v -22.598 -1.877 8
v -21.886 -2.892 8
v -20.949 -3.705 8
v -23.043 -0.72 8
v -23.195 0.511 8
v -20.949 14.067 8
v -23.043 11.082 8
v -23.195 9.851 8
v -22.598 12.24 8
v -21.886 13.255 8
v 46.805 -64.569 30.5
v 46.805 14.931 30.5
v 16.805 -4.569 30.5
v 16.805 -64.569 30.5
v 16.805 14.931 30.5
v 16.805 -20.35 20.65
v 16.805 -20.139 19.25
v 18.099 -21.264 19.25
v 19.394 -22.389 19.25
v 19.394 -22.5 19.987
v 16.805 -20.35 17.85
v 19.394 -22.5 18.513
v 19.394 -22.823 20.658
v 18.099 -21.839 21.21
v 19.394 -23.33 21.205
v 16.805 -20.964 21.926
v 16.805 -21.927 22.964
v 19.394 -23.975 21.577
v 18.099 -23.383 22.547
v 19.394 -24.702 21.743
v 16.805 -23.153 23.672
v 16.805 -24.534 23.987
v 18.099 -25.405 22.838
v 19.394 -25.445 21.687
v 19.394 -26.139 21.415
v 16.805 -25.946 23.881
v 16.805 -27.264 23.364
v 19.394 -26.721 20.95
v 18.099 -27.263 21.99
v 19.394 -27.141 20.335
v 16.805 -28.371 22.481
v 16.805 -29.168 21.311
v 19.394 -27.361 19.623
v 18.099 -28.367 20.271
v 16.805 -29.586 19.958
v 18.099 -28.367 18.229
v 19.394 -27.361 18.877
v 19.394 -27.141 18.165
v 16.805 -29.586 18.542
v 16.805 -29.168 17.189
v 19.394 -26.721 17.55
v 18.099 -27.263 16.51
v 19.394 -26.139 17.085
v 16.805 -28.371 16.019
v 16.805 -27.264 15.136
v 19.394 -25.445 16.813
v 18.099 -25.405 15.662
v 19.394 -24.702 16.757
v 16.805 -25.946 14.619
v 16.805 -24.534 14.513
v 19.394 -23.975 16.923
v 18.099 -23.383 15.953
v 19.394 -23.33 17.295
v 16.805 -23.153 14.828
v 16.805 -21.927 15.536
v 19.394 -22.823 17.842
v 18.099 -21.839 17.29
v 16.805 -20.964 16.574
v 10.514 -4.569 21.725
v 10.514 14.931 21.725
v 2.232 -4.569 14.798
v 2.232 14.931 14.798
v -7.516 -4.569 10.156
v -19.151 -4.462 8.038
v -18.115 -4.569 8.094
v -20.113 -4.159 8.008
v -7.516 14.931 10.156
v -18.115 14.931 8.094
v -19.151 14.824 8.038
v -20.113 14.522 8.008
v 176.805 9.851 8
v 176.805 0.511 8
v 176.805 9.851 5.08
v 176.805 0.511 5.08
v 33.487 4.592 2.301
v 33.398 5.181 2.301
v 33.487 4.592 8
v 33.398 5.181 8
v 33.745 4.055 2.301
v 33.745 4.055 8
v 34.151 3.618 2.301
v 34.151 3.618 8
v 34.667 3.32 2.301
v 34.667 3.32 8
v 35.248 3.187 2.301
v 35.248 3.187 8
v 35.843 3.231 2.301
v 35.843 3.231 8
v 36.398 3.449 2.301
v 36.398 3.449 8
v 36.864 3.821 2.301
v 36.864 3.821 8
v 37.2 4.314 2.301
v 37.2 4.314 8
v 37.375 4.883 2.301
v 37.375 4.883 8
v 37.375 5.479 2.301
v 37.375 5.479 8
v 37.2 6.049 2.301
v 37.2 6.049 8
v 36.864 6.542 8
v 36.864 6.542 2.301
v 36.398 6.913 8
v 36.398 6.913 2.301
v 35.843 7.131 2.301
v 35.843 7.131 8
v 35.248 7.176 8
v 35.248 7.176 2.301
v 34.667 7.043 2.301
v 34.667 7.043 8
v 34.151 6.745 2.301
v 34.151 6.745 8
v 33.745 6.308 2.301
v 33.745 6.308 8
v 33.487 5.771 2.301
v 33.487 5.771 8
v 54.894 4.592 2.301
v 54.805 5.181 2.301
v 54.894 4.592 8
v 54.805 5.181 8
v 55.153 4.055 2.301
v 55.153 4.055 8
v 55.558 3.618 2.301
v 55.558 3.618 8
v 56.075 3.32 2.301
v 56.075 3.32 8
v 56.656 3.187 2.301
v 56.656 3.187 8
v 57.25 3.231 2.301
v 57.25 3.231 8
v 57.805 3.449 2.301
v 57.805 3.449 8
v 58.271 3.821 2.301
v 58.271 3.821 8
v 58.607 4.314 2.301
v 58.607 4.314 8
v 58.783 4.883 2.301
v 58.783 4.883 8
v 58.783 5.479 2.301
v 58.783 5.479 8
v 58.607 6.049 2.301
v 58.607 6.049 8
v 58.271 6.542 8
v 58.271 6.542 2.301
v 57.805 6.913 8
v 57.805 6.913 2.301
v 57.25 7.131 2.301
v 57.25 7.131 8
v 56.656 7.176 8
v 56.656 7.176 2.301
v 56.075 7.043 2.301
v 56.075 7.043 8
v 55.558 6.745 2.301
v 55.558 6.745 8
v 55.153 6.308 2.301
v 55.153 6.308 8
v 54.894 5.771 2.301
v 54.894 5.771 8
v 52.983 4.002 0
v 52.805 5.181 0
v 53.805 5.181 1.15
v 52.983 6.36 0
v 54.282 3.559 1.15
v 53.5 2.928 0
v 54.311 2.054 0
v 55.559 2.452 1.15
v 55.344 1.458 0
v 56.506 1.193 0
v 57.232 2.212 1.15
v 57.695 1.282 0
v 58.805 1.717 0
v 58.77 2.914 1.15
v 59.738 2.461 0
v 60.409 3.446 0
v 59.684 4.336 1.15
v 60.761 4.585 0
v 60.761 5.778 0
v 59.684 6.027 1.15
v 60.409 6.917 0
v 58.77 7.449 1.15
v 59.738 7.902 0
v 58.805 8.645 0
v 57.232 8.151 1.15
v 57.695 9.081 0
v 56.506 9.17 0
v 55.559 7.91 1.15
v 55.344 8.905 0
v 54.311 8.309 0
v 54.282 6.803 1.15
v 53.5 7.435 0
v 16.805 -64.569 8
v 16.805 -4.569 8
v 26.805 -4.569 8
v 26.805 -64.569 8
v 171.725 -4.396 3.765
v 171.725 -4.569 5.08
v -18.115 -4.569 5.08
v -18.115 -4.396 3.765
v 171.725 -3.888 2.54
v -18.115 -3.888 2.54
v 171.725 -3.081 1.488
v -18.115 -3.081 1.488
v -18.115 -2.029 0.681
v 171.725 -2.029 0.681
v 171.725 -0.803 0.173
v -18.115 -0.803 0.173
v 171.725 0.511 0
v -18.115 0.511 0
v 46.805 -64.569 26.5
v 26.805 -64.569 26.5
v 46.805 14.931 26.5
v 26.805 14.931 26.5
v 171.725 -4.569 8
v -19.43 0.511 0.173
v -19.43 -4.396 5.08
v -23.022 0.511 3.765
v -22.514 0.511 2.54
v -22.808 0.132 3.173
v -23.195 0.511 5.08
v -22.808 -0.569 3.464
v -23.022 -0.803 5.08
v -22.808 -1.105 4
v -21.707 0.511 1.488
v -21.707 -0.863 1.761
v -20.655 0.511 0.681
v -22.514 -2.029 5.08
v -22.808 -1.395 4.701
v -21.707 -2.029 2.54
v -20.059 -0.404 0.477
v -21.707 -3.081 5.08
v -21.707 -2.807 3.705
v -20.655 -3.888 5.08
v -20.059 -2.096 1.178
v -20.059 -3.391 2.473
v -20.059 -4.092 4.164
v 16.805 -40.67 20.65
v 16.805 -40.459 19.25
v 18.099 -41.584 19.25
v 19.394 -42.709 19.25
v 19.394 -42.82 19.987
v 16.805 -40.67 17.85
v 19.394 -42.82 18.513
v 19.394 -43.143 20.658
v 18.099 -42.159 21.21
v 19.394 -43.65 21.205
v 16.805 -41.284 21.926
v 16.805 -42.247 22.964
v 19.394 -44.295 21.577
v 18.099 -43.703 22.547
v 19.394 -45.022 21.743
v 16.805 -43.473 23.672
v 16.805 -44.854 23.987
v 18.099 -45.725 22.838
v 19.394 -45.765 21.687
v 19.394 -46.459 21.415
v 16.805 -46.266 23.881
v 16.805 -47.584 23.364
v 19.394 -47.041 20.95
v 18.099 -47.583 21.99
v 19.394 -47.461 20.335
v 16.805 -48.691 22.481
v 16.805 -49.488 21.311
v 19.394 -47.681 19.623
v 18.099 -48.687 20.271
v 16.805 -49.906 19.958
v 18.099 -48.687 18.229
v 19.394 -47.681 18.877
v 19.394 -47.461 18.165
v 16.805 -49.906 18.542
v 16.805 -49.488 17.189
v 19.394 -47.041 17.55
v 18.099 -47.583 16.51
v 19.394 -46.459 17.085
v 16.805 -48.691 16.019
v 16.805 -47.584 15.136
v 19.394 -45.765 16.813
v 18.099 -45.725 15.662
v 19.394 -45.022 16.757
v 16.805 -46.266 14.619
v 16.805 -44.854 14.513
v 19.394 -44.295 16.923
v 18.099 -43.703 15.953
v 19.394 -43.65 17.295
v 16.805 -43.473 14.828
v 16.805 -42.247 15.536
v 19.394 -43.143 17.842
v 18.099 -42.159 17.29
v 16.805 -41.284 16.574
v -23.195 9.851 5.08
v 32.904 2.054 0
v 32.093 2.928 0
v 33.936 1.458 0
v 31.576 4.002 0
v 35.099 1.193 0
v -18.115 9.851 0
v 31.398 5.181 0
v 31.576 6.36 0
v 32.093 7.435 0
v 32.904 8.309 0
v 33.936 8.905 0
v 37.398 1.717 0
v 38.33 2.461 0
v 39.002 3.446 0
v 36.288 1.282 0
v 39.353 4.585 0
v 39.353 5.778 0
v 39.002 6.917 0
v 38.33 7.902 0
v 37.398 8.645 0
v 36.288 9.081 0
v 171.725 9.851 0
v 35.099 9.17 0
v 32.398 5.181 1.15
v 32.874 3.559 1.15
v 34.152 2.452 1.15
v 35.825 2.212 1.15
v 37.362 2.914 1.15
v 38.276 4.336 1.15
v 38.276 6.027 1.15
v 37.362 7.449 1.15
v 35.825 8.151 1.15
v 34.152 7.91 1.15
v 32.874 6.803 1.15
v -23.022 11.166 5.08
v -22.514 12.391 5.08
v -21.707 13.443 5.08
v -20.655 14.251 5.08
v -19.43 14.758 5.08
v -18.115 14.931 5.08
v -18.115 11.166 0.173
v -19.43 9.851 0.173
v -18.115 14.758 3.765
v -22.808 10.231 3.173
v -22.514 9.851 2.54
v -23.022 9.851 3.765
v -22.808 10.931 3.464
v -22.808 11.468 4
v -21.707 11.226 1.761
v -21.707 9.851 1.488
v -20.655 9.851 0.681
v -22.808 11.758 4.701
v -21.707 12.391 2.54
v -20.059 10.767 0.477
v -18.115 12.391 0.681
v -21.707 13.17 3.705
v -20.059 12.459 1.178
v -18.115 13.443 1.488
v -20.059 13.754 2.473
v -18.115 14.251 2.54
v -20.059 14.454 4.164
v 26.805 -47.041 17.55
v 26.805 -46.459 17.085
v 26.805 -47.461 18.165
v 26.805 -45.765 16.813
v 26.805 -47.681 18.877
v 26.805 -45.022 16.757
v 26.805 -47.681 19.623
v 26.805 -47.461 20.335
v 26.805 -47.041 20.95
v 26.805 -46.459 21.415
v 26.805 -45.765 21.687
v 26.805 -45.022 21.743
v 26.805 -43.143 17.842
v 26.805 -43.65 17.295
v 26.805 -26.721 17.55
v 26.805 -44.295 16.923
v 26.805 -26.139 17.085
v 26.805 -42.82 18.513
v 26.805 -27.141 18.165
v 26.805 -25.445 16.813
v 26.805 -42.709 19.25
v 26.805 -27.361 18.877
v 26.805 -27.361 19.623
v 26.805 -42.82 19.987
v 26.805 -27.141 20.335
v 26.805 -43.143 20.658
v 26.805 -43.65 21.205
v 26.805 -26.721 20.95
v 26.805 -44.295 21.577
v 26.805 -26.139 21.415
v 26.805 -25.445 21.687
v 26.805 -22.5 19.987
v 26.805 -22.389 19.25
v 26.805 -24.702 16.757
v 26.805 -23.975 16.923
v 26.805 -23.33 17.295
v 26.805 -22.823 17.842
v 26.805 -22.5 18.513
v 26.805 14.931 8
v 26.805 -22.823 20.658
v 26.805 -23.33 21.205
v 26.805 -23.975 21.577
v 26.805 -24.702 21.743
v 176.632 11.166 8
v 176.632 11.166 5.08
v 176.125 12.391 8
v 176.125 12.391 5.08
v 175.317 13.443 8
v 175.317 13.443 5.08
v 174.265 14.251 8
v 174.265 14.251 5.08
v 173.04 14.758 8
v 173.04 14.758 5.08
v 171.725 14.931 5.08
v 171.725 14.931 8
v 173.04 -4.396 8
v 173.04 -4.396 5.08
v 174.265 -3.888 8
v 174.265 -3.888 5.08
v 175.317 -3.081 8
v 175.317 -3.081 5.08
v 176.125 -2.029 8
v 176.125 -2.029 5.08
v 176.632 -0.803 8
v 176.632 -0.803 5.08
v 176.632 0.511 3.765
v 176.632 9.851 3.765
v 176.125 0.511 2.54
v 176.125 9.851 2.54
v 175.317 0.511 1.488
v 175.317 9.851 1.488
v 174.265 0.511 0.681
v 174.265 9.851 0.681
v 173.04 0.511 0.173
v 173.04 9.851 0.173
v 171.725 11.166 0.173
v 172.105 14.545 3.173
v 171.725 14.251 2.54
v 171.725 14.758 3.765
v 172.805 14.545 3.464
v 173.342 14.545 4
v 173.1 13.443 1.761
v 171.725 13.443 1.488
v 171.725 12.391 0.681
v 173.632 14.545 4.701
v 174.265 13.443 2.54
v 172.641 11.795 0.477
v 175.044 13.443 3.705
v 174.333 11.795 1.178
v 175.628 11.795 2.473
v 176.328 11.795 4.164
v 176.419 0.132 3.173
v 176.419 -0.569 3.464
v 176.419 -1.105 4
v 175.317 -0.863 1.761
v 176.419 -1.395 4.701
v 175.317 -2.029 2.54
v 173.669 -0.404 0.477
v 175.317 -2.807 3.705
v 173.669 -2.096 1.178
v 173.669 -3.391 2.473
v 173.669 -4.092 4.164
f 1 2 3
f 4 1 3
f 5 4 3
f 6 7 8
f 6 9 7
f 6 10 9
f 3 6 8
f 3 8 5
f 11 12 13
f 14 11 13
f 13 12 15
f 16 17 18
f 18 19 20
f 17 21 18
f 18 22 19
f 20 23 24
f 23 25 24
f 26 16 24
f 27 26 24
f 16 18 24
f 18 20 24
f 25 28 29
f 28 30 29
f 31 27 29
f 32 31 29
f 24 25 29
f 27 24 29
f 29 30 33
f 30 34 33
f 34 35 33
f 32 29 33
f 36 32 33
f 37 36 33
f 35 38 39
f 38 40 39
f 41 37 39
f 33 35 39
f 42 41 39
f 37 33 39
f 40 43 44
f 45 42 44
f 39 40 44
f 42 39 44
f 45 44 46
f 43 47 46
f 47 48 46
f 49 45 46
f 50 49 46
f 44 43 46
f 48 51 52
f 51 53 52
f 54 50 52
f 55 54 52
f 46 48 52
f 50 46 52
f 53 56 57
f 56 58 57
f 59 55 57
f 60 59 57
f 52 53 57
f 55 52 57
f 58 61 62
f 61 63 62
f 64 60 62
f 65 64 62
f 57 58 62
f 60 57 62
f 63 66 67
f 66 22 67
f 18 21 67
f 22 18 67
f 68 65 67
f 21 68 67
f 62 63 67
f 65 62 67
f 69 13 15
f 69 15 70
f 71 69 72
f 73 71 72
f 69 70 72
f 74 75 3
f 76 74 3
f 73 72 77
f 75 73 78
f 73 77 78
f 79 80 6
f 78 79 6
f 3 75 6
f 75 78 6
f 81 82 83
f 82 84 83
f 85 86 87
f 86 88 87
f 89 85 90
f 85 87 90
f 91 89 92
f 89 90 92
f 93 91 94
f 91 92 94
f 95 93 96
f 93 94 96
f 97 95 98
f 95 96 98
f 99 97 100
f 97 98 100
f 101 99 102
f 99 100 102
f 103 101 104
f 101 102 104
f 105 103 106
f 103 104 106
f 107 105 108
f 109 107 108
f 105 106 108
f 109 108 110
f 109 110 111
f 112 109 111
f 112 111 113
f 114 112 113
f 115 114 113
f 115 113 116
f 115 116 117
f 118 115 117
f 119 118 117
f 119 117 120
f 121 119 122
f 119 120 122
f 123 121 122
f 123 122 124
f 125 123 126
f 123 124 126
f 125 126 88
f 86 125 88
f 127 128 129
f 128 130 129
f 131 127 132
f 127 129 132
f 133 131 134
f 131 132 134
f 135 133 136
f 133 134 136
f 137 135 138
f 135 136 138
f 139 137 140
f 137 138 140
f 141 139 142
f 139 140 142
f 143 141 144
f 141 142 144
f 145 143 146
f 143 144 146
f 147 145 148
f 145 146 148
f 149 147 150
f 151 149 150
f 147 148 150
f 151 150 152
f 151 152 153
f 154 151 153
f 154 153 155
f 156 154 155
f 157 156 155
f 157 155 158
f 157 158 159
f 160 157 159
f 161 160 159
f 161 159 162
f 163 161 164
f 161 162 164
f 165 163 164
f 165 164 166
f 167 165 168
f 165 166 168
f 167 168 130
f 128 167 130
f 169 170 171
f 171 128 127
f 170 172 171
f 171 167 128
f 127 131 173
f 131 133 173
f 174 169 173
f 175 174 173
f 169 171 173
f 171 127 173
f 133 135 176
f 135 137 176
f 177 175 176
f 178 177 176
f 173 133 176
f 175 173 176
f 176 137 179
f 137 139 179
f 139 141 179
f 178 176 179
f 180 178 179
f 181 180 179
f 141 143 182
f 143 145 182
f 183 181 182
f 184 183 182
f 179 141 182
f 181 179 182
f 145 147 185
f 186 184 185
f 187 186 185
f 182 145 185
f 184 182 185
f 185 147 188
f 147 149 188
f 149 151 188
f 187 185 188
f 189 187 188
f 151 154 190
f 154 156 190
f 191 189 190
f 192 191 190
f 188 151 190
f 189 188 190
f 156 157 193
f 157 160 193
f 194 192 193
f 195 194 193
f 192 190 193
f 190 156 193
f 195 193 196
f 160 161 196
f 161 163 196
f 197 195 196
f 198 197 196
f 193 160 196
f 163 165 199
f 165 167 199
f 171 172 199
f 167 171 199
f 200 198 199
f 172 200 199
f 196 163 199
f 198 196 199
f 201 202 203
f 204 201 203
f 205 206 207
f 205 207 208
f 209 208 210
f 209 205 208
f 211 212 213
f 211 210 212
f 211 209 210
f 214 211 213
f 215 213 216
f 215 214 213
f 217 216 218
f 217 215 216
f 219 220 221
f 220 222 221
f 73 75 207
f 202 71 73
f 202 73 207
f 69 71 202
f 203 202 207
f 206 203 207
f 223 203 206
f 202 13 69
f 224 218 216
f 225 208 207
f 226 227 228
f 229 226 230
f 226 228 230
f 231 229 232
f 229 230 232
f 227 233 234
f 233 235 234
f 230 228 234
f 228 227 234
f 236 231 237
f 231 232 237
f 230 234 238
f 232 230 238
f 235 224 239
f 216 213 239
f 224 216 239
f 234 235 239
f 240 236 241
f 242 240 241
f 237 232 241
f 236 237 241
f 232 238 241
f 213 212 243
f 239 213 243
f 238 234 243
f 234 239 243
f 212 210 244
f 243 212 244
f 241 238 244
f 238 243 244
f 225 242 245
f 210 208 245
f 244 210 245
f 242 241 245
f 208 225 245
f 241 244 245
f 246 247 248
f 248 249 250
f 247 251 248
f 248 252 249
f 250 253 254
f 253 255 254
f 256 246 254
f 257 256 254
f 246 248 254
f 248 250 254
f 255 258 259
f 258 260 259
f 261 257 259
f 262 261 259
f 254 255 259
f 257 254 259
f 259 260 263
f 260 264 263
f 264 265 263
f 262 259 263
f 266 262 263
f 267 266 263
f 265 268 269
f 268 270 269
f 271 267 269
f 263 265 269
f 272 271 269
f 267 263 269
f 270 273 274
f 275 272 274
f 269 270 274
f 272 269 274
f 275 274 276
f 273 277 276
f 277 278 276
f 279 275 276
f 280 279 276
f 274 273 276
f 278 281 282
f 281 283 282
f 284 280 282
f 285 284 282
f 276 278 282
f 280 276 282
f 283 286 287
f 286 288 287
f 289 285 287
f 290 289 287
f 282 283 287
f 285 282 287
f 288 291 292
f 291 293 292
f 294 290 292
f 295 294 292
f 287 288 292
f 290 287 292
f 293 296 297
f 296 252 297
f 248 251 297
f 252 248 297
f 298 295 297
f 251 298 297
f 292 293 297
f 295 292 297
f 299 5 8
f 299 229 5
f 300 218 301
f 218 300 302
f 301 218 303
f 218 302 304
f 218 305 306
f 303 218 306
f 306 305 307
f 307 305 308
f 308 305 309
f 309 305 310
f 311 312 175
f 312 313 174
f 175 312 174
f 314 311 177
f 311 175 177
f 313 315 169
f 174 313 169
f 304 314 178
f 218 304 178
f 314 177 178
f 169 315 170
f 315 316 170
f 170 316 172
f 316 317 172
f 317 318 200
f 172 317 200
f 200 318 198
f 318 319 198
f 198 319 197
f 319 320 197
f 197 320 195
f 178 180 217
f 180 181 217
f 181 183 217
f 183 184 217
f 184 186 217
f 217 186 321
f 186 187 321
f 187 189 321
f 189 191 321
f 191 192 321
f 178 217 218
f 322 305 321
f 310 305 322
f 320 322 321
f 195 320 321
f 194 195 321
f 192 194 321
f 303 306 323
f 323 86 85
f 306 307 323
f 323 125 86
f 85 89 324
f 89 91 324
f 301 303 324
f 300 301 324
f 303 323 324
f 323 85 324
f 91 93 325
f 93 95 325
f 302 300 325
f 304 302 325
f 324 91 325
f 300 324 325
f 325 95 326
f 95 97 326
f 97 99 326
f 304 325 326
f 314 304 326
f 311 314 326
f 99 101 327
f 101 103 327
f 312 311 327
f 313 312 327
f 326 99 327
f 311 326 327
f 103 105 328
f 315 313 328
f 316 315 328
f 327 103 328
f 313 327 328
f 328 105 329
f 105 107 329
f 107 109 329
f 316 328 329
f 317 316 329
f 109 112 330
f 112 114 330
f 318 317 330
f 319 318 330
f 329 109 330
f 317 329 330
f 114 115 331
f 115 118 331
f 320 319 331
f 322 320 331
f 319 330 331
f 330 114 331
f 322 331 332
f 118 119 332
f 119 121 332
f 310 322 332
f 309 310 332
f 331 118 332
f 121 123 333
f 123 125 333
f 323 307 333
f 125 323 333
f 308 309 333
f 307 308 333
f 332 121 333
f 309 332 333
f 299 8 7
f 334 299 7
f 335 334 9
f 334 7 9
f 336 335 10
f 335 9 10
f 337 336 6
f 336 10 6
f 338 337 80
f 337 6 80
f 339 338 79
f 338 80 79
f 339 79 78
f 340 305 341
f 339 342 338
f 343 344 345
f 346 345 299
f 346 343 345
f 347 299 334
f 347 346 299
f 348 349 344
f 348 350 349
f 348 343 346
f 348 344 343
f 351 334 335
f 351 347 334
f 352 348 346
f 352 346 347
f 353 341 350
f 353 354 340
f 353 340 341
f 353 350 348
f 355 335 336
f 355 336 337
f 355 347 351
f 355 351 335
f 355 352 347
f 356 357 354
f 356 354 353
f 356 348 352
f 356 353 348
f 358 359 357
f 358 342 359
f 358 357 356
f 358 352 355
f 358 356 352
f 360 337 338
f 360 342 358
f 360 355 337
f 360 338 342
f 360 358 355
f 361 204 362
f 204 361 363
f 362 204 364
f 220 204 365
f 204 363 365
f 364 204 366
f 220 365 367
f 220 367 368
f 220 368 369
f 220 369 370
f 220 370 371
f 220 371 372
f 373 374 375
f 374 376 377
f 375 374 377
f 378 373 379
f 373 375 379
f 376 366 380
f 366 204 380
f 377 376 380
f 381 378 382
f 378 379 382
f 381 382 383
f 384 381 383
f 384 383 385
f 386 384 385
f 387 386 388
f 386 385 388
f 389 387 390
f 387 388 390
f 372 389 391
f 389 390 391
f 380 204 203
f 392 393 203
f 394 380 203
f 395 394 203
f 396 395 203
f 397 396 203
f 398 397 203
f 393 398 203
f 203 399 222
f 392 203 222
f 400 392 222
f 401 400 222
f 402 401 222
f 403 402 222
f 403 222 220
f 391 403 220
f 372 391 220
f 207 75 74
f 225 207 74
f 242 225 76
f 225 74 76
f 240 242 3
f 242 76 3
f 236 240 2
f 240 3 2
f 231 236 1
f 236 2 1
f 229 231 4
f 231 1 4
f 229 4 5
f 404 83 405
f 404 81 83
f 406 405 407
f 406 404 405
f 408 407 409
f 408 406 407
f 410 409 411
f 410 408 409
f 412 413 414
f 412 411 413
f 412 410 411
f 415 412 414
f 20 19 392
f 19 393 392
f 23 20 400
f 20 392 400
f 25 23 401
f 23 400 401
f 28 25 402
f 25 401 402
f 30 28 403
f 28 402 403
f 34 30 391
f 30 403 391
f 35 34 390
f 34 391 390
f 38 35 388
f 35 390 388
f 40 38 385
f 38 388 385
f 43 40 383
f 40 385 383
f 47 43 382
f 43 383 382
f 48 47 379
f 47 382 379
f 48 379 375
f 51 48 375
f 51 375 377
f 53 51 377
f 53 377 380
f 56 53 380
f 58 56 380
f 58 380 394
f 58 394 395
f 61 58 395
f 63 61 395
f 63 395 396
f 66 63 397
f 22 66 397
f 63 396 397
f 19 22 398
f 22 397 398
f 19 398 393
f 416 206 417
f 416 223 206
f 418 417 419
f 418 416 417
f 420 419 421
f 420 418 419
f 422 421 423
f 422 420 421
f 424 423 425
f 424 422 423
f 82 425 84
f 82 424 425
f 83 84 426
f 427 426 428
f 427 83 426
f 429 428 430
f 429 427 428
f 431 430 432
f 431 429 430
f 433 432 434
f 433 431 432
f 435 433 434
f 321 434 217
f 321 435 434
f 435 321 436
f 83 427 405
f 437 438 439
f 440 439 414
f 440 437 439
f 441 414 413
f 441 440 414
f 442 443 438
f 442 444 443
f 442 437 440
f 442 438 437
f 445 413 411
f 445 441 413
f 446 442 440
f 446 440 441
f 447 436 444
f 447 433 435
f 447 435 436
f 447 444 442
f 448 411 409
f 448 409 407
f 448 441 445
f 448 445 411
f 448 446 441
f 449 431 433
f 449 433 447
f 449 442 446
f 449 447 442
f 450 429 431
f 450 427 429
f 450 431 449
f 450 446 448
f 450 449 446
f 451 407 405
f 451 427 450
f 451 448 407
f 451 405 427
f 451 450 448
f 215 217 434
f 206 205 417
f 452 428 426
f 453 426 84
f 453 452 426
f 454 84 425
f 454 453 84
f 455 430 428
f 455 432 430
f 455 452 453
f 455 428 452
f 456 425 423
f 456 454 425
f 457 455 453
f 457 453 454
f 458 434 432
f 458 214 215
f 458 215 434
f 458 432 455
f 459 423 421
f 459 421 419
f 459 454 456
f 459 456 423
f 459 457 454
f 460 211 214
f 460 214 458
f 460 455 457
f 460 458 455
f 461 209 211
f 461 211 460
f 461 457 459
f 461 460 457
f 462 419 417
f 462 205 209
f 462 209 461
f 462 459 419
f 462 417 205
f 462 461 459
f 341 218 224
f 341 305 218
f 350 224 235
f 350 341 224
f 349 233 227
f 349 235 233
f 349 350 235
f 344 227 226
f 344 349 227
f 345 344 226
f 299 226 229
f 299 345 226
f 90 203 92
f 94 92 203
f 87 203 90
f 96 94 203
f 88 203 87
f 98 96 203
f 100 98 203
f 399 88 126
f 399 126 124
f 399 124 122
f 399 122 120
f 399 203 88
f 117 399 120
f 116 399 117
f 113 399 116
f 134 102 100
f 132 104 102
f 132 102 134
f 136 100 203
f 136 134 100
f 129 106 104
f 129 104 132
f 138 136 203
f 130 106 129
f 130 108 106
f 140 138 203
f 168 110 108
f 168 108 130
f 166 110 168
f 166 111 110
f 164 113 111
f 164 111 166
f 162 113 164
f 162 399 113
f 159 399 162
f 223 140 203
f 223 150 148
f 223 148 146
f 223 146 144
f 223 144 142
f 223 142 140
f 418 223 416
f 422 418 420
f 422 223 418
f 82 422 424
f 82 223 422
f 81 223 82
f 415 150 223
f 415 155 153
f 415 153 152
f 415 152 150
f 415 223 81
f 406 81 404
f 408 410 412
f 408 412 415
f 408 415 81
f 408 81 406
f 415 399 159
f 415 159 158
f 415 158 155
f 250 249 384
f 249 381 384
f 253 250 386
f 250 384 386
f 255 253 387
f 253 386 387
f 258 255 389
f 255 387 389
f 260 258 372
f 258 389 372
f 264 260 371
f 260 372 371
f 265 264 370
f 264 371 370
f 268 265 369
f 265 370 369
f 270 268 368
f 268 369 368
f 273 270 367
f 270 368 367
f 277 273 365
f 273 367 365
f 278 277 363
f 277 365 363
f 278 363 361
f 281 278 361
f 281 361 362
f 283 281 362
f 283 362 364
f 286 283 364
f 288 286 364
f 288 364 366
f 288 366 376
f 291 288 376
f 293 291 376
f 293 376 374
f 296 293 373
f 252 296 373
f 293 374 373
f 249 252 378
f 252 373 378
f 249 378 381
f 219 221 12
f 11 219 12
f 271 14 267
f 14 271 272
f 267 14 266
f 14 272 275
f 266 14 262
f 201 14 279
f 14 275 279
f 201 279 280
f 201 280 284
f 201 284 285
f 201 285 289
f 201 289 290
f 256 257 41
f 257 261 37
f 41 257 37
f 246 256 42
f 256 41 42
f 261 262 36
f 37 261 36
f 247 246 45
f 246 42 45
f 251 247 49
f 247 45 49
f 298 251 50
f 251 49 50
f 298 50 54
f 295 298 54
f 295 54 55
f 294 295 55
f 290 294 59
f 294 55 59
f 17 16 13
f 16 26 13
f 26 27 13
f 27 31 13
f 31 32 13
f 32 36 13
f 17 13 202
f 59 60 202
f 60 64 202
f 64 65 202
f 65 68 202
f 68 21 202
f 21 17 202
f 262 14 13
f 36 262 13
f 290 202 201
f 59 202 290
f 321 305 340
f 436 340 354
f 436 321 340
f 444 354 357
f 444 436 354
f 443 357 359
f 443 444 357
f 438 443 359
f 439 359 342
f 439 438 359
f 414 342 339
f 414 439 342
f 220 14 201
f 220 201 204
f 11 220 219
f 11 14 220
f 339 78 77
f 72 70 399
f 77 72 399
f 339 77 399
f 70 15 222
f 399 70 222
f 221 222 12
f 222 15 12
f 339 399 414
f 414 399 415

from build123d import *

# Parameters (mm, degrees)
F0_W            = 200
F0_H            = 19.5
F1_DEPTH        = 8
F2_W            = 10
F2_H            = 19.5
F3_DEPTH        = 22.5
F4_W            = 19.5
F4_H            = 4
F5_DEPTH        = 20
F7_DEPTH        = 60
F9_D            = 4
F9_DEPTH        = 8
F9_CSINK_D      = 8
F9_CSINK_ANGLE  = 82
F9_TIP          = 1.2017212381
F10_T1_DEPTH    = 19.5
F12_D           = 5
F12_DEPTH       = 20
F12_CSINK_D     = 9.5
F12_CSINK_ANGLE = 82
F12_TIP         = 1.5021515476
F13_R           = 5.08


# Not quite as in the source:
# - a fillet or chamfer that OpenCascade refuses, or shapes differently, is made with other operations: its cross-section is extruded or revolved along the edge and cut away or added


with BuildPart() as f1:
    # F0 (on Top) → F1 (new body)
    with BuildSketch(Plane.XY):
        with Locations((76.8052995205, 5.1813468188)):
            Rectangle(F0_W, F0_H)
    extrude(amount=F1_DEPTH)

    # F2 (on face) → F3 (join)
    with BuildSketch(Plane.XY.offset(8)):
        with Locations((21.8052995205, 5.1813468188)):
            Rectangle(F2_W, F2_H)
    extrude(amount=F3_DEPTH)

    # F4 (on face) → F5 (join)
    with BuildSketch(Plane.YZ.offset(26.8052995205)):
        with Locations((5.1813468188, 28.5)):
            Rectangle(F4_W, F4_H)
    extrude(amount=F5_DEPTH)

    # F6 (on face) → F7 (join)
    with BuildSketch(Plane.XZ.offset(4.5686531812)):
        Polygon((16.8052995205, 30.5), (16.8052995205, 8), (26.8052995205, 8), (26.8052995205, 26.5), (46.8052995205, 26.5), (46.8052995205, 30.5), align=None)
    extrude(amount=F7_DEPTH)

    # F9
    with Locations(Plane(origin=(0, 0, 0), x_dir=(1, 0, 0), z_dir=(0, 0, -1))):
        with Locations((35.3978276253, -5.1813468188), (56.8052995205, -5.1813468188)):
            CounterSinkHole(F9_D / 2, F9_CSINK_D / 2, depth=F9_DEPTH, counter_sink_angle=F9_CSINK_ANGLE)
            with Locations((0, 0, -(F9_DEPTH + F9_TIP / 2))):  # 118° drill point
                Cone(0, F9_D / 2, F9_TIP, mode=Mode.SUBTRACT)

    # F10: fillet of radius 42.924717139 on 1 edges, made by hand

    # F10_s2 → F10_t1 (join)
    with BuildSketch(Plane.XZ.offset(-14.9313468188)):
        with BuildLine():
            ThreePointArc((16.8052995205, 30.5), (1.0263848307, 14.0515795772), (-20.9486707509, 8))
            Line((-20.9486707509, 8), (16.8052995205, 8))
            Line((16.8052995205, 8), (16.8052995205, 30.5))
        make_face()
    extrude(amount=F10_T1_DEPTH)

    # F12
    with Locations(Plane(origin=(16.8052995205, 0, 0), x_dir=(0, -1, 0), z_dir=(-1, 0, 0))):
        with Locations((24.8886531812, 19.25), (45.2086531812, 19.25)):
            CounterSinkHole(F12_D / 2, F12_CSINK_D / 2, depth=F12_DEPTH, counter_sink_angle=F12_CSINK_ANGLE)
            with Locations((0, 0, -(F12_DEPTH + F12_TIP / 2))):  # 118° drill point
                Cone(0, F12_D / 2, F12_TIP, mode=Mode.SUBTRACT)

    # F13
    f13_edges = [f1.edges().sort_by_distance(p)[0] for p in [
        (76.8053, -4.568653, 0),
        (176.8053, 5.181347, 0),
        (76.8053, 14.931347, 0),
        (-23.1947, 5.181347, 0),
        (176.8053, 14.931347, 4),
        (176.8053, -4.568653, 4),
        (-23.1947, 14.931347, 4),
        (-23.1947, -4.568653, 4),
    ]]
    fillet(f13_edges, radius=F13_R)


solid = f1.part
